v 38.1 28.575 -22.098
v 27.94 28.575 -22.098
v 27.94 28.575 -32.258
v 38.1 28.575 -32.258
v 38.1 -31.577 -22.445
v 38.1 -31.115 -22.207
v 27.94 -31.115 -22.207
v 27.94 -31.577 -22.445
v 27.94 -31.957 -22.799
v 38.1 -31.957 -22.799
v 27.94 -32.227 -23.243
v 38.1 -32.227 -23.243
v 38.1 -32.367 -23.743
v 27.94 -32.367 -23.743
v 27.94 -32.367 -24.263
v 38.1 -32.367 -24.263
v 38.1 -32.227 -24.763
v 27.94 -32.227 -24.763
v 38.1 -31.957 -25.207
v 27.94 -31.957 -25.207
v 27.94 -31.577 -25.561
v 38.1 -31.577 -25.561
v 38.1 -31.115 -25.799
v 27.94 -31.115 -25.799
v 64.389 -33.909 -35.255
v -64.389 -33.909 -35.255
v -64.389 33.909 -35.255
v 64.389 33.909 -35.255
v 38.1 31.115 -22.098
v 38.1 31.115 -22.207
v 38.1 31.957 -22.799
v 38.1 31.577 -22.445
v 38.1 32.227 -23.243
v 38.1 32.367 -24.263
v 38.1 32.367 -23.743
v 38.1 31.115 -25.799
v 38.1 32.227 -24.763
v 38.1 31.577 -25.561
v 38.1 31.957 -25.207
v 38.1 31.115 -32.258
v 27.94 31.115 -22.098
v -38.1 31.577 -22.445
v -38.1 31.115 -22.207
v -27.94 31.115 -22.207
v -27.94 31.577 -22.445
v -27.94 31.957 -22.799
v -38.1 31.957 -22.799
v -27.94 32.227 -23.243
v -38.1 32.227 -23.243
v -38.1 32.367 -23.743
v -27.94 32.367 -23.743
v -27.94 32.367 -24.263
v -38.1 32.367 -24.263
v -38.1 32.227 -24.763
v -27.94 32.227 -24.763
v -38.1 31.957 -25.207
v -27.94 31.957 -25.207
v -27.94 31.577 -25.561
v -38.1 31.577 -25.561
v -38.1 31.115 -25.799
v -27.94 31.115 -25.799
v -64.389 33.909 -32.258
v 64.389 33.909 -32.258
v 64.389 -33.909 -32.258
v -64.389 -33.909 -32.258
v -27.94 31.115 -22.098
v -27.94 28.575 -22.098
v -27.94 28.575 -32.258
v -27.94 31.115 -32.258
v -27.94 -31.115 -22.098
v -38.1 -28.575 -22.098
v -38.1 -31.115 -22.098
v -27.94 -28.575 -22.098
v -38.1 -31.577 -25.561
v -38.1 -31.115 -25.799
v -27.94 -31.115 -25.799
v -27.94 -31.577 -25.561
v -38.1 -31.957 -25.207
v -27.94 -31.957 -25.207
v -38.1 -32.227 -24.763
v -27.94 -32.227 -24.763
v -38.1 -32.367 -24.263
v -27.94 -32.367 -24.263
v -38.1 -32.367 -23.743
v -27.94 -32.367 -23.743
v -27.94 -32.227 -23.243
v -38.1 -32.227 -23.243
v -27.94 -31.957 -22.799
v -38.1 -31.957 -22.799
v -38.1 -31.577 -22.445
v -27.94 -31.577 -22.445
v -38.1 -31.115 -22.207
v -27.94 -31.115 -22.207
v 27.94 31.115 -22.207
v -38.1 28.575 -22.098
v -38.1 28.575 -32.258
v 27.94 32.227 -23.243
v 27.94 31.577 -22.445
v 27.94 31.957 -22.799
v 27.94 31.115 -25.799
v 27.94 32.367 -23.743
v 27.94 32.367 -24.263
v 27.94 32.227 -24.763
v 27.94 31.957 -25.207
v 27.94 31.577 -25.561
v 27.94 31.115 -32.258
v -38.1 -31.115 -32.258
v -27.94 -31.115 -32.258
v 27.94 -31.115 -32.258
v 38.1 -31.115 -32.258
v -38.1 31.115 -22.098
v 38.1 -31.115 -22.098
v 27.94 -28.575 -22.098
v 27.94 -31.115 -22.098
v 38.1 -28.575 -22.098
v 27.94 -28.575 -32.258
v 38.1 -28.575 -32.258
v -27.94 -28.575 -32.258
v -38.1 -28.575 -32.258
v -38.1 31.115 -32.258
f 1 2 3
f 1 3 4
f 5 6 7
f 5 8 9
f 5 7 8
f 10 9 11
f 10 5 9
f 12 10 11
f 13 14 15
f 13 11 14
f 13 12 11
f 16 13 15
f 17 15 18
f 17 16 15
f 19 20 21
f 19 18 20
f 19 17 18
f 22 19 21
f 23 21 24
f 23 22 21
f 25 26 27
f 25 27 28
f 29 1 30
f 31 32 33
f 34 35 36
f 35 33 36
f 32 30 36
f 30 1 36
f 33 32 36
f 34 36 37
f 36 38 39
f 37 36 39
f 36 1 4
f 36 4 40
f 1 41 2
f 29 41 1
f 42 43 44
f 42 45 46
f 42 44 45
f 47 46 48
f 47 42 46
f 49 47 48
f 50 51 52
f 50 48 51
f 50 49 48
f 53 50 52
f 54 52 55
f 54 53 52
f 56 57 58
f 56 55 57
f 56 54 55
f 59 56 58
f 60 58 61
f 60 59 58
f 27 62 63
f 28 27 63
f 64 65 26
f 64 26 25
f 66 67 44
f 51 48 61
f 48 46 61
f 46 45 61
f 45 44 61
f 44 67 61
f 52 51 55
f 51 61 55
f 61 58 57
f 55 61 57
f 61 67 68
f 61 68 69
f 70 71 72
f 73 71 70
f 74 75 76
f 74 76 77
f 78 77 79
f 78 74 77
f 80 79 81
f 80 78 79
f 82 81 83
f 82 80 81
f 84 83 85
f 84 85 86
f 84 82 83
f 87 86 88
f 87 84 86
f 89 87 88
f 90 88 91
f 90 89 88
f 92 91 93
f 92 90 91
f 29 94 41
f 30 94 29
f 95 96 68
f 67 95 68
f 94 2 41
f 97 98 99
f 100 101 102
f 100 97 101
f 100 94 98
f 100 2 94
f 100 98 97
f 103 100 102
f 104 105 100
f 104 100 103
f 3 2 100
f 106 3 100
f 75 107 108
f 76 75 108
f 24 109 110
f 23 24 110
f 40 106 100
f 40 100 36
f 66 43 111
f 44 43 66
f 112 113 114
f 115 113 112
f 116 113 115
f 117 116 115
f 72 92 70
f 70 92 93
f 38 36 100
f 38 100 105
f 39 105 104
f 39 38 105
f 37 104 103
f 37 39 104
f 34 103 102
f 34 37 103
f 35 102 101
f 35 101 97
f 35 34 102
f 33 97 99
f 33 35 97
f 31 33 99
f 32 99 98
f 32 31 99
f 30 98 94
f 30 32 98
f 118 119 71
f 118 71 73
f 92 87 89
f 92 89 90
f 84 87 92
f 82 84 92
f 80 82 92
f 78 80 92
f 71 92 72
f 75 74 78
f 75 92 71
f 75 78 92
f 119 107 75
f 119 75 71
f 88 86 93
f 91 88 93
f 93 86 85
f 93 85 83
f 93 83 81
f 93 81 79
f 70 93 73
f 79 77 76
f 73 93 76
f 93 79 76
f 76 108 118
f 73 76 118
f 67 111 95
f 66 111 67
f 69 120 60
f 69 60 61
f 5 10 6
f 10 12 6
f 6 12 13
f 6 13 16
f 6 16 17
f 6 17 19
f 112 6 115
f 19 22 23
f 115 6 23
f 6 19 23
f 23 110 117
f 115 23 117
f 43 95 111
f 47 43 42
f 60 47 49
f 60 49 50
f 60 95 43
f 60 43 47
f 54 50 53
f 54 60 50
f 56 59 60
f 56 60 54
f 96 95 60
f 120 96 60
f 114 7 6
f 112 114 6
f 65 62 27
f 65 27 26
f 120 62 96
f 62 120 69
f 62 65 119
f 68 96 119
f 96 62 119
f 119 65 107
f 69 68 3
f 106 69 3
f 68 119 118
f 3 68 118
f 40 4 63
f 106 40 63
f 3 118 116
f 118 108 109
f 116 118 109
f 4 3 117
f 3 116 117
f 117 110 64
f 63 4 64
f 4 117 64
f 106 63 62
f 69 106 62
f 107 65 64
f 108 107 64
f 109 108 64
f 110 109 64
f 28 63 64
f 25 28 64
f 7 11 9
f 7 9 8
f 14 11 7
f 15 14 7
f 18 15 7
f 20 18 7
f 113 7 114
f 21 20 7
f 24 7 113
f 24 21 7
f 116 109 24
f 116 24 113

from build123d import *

# Parameters (mm, degrees)
SKETCH005_W  = 128.778
SKETCH005_H  = 67.818
PAD004_DEPTH = 2.9972
SKETCH006_W  = 10.16
SKETCH006_H  = 2.54
PAD005_DEPTH = 10.16
SKETCH007_R  = 1.905
PAD006_DEPTH = 10.16
SKETCH008_R  = 1.905
PAD007_DEPTH = 10.16


with BuildPart() as part:
    # Sketch005 → Pad004 (new body)
    with BuildSketch(Plane(origin=(0, 0, -32.258), x_dir=(1, 0, 0), z_dir=(0, 0, -1))):
        Rectangle(SKETCH005_W, SKETCH005_H)
    extrude(amount=PAD004_DEPTH)

    # Sketch006 → Pad005 (new body)
    with BuildSketch(Plane.XY.offset(-32.258)):
        with Locations((-33.02, -29.845)):
            Rectangle(SKETCH006_W, SKETCH006_H)
        with Locations((33.02, -29.845)):
            Rectangle(SKETCH006_W, SKETCH006_H)
        with Locations((33.02, 29.845)):
            Rectangle(SKETCH006_W, SKETCH006_H)
        with Locations((-33.02, 29.845)):
            Rectangle(SKETCH006_W, SKETCH006_H)
    extrude(amount=PAD005_DEPTH)

    # Sketch007 → Pad006 (new body)
    with BuildSketch(Plane(origin=(38.1, 0, -32.258), x_dir=(0, -1, 0), z_dir=(1, 0, 0))):
        with Locations((-30.48, -8.255)):
            Circle(SKETCH007_R)
        with Locations((30.48, -8.255)):
            Circle(SKETCH007_R)
    extrude(amount=-PAD006_DEPTH)

    # Sketch008 → Pad007 (new body)
    with BuildSketch(Plane(origin=(-38.1, 0, -32.258), x_dir=(0, 1, 0), z_dir=(-1, 0, 0))):
        with Locations((-30.48, -8.255)):
            Circle(SKETCH008_R)
        with Locations((30.48, -8.255)):
            Circle(SKETCH008_R)
    extrude(amount=-PAD007_DEPTH)


solid = part.part
